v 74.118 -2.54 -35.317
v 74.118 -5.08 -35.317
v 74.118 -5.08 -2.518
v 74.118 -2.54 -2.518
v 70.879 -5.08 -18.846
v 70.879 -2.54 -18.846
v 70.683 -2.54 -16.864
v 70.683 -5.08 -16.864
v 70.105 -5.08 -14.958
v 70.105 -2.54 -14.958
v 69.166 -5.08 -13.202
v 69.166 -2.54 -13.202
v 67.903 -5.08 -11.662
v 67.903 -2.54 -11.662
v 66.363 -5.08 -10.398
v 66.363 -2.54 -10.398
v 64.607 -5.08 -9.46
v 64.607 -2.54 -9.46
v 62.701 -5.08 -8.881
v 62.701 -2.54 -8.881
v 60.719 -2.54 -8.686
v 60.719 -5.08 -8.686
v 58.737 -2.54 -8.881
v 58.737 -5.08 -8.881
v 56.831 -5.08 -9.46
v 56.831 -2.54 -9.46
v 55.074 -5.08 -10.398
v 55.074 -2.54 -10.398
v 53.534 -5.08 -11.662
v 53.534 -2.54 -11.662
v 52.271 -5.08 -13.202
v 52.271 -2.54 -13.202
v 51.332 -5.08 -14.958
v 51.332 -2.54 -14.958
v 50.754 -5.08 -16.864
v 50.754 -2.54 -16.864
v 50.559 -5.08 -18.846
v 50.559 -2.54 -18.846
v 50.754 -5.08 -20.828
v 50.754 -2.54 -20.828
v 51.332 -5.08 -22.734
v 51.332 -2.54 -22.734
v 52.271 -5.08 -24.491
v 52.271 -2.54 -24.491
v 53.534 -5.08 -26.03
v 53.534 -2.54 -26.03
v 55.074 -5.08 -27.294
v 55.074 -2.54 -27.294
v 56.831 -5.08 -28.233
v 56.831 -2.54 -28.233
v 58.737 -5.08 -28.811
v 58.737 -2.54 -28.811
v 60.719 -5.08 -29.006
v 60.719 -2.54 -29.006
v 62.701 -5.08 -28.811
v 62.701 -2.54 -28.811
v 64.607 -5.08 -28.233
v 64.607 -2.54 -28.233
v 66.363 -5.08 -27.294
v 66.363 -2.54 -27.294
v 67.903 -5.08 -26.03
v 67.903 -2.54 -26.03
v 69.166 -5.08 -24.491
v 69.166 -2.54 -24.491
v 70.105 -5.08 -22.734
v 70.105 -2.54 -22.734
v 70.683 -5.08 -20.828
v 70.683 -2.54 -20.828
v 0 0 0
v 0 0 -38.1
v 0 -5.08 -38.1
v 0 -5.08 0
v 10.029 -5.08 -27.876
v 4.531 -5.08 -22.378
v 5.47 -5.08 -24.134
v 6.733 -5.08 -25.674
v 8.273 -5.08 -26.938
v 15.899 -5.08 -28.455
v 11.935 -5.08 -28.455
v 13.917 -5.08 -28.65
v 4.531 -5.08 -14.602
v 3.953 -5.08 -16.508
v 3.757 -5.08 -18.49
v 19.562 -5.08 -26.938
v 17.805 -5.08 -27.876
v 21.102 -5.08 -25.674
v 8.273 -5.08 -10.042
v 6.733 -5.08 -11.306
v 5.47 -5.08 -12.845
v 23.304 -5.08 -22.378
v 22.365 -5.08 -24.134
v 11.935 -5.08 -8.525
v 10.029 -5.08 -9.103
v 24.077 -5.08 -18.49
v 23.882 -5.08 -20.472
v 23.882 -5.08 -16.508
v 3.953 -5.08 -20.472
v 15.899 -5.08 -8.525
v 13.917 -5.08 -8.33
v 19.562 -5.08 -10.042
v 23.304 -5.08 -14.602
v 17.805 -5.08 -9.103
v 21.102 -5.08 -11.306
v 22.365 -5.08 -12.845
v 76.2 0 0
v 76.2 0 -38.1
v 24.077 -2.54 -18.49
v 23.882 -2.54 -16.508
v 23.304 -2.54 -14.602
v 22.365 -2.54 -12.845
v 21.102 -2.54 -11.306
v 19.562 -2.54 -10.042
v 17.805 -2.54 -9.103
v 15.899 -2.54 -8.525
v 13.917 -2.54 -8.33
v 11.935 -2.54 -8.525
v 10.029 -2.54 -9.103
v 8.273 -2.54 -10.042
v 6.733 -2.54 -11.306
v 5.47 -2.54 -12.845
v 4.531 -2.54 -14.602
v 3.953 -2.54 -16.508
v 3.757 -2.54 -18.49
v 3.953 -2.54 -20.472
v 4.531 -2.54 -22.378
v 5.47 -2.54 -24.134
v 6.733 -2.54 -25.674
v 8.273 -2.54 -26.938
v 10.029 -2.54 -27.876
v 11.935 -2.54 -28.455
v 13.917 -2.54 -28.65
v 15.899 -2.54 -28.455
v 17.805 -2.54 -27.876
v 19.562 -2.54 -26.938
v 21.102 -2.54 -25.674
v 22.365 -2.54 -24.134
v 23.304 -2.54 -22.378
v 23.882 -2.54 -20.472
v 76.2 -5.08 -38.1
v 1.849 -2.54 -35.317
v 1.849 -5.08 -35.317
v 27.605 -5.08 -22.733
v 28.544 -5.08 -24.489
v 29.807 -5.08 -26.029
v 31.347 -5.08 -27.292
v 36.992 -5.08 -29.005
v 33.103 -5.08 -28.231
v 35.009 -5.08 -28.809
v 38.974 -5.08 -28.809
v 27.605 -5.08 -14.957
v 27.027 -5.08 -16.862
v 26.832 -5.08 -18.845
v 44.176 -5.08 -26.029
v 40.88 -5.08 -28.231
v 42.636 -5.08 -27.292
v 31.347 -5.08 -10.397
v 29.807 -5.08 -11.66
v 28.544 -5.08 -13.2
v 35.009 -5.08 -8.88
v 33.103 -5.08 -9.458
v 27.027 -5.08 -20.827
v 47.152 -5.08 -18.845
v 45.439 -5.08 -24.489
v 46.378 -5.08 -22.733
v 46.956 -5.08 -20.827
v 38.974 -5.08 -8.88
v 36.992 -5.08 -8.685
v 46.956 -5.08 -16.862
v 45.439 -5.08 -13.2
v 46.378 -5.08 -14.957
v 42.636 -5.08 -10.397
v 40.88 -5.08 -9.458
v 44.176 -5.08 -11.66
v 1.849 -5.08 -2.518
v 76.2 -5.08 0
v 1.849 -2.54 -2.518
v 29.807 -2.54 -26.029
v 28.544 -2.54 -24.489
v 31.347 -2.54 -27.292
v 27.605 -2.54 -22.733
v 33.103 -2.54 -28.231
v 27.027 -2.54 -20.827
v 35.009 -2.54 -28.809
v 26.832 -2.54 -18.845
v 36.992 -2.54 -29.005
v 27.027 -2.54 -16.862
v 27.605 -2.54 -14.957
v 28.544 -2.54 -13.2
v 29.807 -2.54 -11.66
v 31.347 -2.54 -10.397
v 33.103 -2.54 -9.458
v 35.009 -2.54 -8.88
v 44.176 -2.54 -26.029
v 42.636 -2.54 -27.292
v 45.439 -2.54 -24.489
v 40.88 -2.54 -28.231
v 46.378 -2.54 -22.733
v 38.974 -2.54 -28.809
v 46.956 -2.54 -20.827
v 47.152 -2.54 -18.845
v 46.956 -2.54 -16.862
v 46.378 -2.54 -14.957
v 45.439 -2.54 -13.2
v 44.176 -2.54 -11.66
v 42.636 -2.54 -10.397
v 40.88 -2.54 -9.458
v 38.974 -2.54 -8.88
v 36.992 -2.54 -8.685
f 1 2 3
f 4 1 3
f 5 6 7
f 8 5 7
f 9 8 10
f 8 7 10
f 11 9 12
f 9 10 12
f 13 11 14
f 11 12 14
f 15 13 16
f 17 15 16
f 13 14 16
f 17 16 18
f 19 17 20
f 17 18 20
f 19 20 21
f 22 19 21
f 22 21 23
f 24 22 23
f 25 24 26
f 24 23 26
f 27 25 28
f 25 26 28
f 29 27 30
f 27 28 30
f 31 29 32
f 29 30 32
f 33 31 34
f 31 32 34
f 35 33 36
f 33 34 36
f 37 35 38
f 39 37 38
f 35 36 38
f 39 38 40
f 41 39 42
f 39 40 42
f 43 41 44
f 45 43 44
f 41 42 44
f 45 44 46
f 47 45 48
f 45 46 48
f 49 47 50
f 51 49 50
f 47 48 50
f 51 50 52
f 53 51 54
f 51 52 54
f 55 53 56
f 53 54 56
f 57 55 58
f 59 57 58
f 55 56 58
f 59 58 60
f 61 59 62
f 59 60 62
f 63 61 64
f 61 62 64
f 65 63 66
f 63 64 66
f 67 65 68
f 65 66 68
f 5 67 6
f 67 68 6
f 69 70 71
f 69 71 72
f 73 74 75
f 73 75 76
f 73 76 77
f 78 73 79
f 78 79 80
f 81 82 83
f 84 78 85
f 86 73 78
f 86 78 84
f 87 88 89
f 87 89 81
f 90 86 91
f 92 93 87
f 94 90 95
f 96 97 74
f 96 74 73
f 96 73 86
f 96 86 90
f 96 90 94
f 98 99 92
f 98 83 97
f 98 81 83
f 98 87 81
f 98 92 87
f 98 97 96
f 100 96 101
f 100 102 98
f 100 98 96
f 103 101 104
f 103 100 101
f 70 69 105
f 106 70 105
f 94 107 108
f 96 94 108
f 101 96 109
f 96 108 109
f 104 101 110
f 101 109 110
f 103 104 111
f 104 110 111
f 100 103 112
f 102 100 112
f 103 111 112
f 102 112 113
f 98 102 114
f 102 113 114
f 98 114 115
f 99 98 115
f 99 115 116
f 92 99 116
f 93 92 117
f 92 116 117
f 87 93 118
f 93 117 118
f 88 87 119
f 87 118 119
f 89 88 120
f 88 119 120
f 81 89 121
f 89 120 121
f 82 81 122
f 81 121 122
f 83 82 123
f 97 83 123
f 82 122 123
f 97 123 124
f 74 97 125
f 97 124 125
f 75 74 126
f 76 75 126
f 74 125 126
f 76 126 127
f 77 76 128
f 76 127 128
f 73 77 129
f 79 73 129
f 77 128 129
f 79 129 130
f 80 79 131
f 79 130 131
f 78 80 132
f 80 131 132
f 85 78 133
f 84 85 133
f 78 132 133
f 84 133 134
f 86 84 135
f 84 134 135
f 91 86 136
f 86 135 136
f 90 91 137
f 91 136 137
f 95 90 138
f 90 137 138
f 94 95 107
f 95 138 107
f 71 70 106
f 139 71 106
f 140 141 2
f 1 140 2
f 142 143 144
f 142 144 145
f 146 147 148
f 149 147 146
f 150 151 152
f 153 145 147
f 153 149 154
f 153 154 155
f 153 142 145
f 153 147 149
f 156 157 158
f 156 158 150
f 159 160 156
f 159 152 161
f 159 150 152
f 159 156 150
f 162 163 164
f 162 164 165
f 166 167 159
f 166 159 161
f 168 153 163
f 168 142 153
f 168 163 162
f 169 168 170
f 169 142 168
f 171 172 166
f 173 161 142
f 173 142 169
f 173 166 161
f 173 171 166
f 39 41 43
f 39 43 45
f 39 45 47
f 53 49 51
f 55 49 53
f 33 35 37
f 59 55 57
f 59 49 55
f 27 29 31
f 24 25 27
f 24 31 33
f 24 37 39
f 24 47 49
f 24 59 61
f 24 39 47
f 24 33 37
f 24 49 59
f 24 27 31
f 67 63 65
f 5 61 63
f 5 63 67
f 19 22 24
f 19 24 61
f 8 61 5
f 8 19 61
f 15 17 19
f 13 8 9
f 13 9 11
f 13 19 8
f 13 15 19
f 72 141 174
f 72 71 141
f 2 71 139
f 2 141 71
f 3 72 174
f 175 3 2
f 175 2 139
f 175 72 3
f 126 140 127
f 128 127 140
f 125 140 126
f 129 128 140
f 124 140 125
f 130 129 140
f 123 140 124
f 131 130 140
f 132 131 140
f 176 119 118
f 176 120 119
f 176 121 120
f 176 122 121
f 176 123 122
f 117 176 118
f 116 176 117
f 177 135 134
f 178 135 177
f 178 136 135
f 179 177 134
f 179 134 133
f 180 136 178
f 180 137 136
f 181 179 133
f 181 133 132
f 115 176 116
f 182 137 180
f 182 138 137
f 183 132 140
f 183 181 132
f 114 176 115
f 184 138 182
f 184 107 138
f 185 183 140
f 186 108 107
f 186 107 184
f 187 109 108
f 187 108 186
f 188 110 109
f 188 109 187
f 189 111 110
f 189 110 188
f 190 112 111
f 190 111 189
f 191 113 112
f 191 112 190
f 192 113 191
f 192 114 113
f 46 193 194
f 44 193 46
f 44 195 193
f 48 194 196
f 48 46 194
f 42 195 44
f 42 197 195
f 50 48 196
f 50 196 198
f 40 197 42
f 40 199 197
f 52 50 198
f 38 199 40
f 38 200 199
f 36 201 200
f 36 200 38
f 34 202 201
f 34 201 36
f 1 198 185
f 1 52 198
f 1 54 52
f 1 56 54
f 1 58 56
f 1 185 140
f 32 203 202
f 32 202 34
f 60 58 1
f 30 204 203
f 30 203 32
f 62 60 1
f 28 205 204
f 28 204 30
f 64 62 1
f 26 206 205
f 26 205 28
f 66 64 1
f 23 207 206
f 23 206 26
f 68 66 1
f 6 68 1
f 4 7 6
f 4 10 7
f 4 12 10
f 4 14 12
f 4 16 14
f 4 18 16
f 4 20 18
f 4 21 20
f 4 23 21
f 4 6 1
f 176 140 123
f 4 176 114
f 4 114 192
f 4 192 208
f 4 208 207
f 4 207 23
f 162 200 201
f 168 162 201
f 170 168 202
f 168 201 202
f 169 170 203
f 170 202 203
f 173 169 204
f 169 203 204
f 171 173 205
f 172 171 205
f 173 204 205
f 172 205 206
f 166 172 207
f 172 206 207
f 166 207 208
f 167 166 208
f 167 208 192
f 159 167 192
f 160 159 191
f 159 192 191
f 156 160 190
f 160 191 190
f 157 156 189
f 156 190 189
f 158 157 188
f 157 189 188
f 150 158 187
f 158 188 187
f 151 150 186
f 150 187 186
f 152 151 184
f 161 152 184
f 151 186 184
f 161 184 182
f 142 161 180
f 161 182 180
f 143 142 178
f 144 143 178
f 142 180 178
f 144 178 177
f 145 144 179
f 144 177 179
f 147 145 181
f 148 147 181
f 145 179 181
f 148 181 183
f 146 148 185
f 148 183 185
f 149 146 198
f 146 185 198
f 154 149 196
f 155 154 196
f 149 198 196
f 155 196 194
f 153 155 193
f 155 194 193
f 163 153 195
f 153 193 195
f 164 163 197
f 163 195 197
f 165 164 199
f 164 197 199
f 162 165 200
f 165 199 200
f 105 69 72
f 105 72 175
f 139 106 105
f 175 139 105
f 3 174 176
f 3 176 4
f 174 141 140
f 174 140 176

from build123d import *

# Parameters (mm, degrees)
F0_W     = 76.2
F0_H     = 38.1
F1_DEPTH = 5.08
F2_W     = 72.268962
F2_H     = 32.798988
F3_DEPTH = 2.54
F4_R     = 10.16
F5_DEPTH = 2.54


with BuildPart() as f1:
    # F0 (on Front) → F1 (new body)
    with BuildSketch(Plane.XZ):
        with Locations((38.1, -19.05)):
            Rectangle(F0_W, F0_H)
    extrude(amount=F1_DEPTH)

    # F2 (on face) → F3 (cut)
    with BuildSketch(Plane.XZ.offset(5.08)):
        with Locations((37.983545, -18.917193)):
            Rectangle(F2_W, F2_H)
    extrude(amount=-F3_DEPTH, mode=Mode.SUBTRACT)

    # F4 (on face) → F5 (join)
    with BuildSketch(Plane.XZ.offset(2.54)):
        with Locations((13.917368, -18.489809)):
            Circle(F4_R)
        with Locations((36.991507, -18.844597)):
            Circle(F4_R)
        with Locations((60.718681, -18.846158)):
            Circle(F4_R)
    extrude(amount=F5_DEPTH)


solid = f1.part
